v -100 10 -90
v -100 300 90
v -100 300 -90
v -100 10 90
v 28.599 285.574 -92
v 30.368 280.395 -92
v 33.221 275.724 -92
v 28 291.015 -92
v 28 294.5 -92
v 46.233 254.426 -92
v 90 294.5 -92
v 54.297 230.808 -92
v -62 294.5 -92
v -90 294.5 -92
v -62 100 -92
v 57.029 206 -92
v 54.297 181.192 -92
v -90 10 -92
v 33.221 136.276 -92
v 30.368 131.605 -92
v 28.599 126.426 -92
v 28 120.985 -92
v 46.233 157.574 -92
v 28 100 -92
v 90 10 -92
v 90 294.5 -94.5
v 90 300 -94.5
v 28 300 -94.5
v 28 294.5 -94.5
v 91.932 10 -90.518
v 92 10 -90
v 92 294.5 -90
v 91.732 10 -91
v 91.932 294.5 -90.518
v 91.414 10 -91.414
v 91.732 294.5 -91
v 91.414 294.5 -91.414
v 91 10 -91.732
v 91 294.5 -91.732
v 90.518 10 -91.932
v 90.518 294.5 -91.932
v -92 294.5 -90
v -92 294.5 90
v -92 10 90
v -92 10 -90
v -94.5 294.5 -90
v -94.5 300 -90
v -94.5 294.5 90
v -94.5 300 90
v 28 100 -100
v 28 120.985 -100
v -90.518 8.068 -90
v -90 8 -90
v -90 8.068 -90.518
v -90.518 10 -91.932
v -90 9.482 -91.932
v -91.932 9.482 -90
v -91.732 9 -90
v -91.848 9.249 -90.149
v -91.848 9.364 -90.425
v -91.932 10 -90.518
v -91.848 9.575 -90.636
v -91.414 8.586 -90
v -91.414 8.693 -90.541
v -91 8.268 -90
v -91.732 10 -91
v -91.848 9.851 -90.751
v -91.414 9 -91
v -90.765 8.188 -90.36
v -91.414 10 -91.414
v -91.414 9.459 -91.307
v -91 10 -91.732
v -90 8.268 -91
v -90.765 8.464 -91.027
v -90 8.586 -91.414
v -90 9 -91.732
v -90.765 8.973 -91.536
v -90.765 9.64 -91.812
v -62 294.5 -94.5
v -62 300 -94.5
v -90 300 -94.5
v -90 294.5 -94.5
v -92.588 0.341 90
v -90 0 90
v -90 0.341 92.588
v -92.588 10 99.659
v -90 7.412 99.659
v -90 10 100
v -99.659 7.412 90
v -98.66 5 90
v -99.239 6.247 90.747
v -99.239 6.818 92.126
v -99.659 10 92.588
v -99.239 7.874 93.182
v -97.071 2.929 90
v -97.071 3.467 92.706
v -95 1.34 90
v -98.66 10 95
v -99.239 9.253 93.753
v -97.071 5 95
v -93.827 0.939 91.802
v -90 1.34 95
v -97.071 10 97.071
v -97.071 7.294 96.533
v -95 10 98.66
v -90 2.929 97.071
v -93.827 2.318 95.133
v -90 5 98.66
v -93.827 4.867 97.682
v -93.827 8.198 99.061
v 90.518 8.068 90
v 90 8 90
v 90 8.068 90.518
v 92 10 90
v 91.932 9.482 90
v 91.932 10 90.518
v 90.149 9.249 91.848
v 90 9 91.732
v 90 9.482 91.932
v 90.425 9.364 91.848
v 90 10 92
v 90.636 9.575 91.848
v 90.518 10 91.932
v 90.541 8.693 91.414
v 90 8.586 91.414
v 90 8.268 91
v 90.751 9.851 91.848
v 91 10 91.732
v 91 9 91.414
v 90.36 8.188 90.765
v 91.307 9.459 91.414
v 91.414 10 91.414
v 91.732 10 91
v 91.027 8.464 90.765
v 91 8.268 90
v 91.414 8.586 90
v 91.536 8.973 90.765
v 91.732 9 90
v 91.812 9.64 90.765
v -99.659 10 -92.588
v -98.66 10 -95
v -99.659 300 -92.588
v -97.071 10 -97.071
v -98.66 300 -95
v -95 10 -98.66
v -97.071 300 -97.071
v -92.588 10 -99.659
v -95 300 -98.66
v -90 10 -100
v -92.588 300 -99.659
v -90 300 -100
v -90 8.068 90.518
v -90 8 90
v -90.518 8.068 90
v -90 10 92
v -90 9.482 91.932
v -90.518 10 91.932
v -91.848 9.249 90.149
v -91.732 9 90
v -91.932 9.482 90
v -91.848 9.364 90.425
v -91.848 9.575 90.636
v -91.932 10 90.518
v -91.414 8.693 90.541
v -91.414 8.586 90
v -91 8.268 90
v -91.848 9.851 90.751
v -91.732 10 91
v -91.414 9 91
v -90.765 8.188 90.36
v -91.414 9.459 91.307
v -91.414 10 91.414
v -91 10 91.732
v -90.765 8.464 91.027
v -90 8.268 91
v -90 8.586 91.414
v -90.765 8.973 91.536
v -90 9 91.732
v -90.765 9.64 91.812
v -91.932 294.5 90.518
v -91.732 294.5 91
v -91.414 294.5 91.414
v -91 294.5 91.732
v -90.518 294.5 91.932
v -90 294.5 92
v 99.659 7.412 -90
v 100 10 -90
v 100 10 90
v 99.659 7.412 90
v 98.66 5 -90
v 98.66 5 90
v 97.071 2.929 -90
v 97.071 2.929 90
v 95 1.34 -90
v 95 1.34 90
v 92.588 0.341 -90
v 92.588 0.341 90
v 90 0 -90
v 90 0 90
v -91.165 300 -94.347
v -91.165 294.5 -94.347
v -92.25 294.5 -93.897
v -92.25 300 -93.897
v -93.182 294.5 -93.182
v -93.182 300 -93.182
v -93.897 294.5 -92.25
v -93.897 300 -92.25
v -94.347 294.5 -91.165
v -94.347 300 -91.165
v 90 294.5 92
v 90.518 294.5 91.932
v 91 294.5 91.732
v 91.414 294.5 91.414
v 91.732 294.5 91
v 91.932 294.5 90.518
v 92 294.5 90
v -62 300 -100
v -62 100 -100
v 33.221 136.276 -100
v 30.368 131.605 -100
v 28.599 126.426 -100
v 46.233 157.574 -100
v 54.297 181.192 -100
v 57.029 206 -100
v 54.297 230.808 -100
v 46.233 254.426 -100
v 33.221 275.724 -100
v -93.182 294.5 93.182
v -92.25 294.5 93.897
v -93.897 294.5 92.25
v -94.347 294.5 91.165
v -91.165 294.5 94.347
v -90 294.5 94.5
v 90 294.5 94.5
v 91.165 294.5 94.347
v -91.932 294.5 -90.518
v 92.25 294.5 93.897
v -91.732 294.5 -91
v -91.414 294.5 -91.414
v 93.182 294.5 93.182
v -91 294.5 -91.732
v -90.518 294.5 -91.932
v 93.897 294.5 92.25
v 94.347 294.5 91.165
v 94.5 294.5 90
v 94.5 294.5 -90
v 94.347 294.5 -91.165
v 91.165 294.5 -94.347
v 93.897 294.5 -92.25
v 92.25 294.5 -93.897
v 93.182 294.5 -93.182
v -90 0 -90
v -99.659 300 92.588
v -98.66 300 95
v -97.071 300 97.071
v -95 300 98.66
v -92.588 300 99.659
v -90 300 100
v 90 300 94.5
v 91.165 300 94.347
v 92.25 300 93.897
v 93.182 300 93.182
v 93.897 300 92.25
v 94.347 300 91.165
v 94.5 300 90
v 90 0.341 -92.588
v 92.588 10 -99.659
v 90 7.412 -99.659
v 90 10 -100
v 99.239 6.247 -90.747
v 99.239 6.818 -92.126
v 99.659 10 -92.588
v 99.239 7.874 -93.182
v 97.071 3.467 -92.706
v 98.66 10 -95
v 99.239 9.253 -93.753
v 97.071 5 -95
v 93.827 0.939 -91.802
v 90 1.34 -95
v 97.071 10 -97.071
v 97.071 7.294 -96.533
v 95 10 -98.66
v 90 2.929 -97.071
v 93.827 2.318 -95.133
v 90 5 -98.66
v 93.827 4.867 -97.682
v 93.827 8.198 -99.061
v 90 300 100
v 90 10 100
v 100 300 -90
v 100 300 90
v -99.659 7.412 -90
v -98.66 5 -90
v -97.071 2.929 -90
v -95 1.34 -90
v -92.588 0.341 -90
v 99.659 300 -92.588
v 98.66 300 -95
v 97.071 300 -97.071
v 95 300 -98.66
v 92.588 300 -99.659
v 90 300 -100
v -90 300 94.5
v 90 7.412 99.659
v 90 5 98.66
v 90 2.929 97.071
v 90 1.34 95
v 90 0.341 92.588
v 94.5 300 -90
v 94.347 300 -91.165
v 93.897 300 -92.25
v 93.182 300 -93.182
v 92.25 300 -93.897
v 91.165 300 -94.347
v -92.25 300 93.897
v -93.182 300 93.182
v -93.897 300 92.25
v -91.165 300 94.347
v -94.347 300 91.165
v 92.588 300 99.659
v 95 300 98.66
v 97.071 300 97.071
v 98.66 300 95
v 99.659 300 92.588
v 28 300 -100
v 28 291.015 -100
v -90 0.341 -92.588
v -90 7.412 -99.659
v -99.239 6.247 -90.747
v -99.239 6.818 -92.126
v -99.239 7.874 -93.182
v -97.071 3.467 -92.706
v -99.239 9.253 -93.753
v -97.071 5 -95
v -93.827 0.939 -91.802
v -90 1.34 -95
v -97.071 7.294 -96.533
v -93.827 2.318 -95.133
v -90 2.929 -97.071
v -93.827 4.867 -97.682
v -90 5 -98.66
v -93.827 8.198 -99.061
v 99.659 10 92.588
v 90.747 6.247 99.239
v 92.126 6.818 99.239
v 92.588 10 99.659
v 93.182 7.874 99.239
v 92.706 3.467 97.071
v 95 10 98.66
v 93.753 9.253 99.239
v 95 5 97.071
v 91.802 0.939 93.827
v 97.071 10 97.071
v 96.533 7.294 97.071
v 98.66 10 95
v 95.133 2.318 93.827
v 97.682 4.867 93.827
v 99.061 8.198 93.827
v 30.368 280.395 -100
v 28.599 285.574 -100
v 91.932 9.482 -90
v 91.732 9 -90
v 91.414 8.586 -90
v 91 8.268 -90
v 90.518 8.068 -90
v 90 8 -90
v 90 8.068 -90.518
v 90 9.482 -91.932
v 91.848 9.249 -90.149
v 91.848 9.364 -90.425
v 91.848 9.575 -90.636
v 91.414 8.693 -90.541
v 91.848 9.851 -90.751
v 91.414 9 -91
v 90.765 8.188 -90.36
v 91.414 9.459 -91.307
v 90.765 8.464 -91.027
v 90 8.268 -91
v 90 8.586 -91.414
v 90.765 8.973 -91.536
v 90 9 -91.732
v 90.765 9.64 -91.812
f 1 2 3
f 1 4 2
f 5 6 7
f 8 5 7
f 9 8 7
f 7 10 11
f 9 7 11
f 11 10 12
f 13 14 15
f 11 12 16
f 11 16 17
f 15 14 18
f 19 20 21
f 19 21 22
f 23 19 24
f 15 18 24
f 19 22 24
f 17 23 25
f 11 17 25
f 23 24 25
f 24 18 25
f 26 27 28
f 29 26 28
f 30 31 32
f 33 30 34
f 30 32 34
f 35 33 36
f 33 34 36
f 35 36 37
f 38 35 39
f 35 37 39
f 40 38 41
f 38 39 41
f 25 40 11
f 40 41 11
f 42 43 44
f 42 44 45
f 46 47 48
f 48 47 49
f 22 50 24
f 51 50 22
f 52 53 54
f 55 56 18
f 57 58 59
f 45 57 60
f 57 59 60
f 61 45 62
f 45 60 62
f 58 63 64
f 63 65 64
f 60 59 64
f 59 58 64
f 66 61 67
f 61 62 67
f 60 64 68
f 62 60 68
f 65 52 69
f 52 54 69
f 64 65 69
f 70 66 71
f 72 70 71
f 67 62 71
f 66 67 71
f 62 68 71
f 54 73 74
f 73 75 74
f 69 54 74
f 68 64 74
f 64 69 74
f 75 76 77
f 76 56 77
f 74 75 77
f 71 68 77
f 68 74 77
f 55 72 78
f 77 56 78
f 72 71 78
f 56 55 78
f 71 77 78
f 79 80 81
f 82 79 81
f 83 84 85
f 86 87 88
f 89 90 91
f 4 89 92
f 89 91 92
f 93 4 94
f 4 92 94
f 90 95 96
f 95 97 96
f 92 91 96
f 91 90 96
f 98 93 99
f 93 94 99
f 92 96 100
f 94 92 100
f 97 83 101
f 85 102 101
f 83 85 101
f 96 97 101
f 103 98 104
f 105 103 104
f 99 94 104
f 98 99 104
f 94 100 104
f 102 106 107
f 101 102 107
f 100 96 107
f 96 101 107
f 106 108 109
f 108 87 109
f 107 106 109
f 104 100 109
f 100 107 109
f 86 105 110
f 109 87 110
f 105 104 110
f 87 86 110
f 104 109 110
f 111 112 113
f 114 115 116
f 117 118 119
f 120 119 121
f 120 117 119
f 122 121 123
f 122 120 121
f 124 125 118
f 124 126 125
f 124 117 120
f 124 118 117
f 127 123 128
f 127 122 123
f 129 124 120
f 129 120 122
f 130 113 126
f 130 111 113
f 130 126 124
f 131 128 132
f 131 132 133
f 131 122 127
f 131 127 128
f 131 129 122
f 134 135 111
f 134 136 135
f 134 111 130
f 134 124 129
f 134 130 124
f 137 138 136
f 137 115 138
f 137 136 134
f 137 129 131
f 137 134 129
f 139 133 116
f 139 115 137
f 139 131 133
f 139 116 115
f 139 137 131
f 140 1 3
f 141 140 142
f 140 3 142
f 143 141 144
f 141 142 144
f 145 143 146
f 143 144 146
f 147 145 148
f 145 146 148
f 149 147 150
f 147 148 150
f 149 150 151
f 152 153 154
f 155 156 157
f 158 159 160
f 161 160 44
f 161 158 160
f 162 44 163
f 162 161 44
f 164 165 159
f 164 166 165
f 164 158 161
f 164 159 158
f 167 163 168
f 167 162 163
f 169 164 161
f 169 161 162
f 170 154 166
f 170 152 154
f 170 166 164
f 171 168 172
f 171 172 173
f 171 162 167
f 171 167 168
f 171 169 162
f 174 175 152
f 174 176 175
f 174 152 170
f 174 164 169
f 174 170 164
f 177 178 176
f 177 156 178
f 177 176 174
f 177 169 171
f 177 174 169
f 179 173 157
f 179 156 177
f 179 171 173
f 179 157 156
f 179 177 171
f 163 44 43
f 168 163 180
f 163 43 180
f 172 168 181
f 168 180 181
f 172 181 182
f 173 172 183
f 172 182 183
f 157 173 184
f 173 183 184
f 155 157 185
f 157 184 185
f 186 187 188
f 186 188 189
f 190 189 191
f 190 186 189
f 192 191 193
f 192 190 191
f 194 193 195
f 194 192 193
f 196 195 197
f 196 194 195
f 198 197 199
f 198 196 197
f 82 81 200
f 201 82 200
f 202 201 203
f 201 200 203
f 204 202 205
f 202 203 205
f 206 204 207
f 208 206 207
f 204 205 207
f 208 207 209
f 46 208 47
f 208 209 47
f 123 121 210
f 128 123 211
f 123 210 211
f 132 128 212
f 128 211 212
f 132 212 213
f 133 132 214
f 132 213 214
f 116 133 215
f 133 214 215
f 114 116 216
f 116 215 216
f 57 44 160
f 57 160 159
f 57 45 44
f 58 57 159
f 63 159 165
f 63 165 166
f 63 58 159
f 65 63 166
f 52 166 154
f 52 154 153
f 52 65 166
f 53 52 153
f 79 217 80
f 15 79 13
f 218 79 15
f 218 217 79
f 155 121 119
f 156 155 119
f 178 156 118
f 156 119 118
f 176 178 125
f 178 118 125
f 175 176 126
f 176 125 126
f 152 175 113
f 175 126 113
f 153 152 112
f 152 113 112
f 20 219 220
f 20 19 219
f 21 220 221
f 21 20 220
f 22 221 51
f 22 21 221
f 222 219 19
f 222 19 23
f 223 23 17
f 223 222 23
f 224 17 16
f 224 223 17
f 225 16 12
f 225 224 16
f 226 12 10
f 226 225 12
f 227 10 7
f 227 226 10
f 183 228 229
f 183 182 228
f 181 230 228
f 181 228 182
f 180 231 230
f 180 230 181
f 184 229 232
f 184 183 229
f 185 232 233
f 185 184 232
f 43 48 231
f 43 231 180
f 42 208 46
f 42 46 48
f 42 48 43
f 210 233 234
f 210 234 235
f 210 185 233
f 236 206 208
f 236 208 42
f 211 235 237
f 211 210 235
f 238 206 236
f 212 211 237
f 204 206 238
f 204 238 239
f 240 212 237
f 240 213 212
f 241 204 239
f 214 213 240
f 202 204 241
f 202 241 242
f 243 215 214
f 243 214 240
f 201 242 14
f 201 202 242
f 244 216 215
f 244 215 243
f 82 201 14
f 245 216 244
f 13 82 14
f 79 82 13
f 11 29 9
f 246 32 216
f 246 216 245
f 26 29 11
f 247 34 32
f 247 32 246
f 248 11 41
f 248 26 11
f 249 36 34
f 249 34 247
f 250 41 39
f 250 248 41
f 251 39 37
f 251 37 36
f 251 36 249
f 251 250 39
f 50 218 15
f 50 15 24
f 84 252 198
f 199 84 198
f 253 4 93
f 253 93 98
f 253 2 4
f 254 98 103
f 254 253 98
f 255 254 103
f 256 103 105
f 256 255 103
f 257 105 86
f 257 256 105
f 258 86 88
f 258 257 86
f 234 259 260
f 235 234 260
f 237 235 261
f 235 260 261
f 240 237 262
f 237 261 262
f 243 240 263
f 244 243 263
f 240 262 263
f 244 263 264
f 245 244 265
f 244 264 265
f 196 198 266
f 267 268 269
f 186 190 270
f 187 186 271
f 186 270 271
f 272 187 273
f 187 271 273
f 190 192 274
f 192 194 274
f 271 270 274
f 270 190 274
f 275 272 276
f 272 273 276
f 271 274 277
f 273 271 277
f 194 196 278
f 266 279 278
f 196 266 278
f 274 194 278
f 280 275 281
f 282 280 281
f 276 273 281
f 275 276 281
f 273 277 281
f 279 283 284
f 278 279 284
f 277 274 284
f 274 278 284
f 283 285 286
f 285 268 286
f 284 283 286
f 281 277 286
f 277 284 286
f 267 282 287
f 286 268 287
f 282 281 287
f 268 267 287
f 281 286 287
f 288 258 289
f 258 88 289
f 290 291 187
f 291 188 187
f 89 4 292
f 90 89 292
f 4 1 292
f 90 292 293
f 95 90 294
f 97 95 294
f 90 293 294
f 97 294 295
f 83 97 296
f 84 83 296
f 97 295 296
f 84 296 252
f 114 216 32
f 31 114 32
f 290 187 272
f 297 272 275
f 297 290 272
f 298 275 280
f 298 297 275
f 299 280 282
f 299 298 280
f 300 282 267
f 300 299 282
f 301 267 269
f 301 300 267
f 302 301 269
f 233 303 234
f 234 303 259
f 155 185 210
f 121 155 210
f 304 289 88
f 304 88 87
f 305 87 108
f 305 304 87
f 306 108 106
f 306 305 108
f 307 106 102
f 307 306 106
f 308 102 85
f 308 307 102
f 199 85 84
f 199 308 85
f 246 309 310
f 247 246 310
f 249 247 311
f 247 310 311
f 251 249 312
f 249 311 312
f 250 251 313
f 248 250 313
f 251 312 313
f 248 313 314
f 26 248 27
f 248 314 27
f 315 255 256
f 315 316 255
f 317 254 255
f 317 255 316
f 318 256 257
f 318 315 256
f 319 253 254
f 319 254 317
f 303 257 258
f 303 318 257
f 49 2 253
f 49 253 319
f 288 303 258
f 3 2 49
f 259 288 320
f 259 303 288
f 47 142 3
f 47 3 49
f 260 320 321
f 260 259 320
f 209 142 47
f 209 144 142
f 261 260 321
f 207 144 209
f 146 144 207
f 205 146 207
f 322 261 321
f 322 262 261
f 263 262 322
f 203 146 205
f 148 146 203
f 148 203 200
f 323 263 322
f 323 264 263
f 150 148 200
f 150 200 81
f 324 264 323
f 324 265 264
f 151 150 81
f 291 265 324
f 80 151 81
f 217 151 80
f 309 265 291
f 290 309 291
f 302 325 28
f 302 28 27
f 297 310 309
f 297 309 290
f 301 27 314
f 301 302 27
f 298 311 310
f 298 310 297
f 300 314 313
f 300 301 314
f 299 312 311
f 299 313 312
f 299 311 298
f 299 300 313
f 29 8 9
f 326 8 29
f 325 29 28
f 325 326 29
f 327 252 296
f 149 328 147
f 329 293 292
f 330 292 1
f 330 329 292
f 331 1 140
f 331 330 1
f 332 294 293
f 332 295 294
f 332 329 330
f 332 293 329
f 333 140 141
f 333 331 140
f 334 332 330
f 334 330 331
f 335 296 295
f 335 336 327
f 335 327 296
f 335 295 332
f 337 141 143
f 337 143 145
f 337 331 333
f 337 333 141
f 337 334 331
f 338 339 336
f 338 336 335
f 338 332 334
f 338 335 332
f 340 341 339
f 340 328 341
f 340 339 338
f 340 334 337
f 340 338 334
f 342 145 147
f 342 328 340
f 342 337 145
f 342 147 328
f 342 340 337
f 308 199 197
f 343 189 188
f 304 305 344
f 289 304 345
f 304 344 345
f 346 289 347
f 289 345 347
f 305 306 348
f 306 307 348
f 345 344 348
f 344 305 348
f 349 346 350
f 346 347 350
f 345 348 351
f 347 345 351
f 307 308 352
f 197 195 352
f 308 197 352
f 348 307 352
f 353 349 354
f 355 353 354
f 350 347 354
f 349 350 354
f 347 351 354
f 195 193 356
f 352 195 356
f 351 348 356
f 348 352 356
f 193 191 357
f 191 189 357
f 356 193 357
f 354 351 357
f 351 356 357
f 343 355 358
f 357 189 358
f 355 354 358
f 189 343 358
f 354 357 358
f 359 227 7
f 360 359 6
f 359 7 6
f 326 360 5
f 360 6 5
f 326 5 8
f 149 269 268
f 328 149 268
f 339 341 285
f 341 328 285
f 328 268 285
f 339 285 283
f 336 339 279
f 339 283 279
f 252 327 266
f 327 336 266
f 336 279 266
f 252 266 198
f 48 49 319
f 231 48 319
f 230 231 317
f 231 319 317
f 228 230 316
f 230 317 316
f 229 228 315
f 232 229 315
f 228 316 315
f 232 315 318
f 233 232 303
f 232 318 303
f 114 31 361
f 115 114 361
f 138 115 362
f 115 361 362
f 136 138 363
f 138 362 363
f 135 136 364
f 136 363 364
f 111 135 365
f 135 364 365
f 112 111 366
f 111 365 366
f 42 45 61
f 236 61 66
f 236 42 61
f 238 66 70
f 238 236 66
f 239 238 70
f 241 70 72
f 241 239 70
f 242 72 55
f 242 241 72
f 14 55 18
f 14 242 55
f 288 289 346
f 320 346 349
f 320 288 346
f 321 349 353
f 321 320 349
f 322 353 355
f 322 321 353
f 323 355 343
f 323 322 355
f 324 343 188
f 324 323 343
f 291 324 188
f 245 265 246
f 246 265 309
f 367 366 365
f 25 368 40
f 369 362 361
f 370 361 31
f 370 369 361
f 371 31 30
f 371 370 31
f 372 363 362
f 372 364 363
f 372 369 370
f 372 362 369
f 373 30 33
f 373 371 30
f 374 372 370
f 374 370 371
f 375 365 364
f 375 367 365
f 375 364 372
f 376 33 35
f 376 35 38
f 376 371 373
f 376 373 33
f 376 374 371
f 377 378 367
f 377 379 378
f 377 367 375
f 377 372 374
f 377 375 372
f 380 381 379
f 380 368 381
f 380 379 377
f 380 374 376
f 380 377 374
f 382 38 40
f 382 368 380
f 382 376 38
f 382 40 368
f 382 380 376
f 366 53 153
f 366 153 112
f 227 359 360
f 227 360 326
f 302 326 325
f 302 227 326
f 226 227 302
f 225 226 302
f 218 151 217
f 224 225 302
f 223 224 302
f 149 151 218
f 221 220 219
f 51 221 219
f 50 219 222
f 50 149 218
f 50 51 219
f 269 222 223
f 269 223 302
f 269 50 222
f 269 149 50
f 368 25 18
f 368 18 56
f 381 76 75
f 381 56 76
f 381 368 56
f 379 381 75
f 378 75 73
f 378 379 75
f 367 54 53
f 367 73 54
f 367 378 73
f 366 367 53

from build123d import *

# Parameters (mm, degrees)
SKETCH1_W           = 200
SKETCH1_H           = 200
BOSS_EXTRUDE1_DEPTH = 300
FILLET1_R           = 10
SHELL1_T            = -8
CUT_EXTRUDE1_DEPTH  = 44
FILLET2_R           = 25
FILLET3_R           = 25
CUT_EXTRUDE2_DEPTH  = 5.5


with BuildPart() as part:
    # Sketch1 → Boss-Extrude1 (new body)
    with BuildSketch(Plane(origin=(0, 0, 0), x_dir=(1, 0, 0), z_dir=(0, 1, 0))):
        Rectangle(SKETCH1_W, SKETCH1_H)
    extrude(amount=BOSS_EXTRUDE1_DEPTH)

    # Fillet1
    fillet1_edges = [part.edges().sort_by_distance(p)[0] for p in [
        (0, 0, -100),
        (100, 0, 0),
        (0, 0, 100),
        (-100, 0, 0),
        (-100, 150, -100),
        (100, 150, -100),
        (100, 150, 100),
        (-100, 150, 100),
    ]]
    fillet(fillet1_edges, radius=FILLET1_R)

    # Shell1
    shell1_openings = [part.faces().sort_by_distance(p)[0] for p in [
        (0, 300, 0),
    ]]
    offset(amount=SHELL1_T, openings=shell1_openings, kind=Kind.INTERSECTION)

    # Sketch2 → Cut-Extrude1 (cut)
    with BuildSketch(Plane(origin=(0, 0, -100), x_dir=(-1, 0, 0), z_dir=(0, 0, -1))):
        with BuildLine():
            Line((62, 100), (-28, 100))
            Line((-28, 100), (-28, 130))
            ThreePointArc((-28, 130), (-57.029416855, 206), (-28, 282))
            Line((-28, 282), (-28, 300))
            Line((-28, 300), (62, 300))
            Line((62, 300), (62, 100))
        make_face()
    extrude(amount=-CUT_EXTRUDE1_DEPTH, mode=Mode.SUBTRACT)

    # Fillet2
    fillet2_edges = [part.edges().sort_by_distance(p)[0] for p in [
        (28, 130, -96),
    ]]
    fillet(fillet2_edges, radius=FILLET2_R)

    # Fillet3
    fillet3_edges = [part.edges().sort_by_distance(p)[0] for p in [
        (28, 282, -96),
    ]]
    fillet(fillet3_edges, radius=FILLET3_R)

    # Sketch3 → Cut-Extrude2 (cut)
    with BuildSketch(Plane(origin=(0, 300, 0), x_dir=(1, 0, 0), z_dir=(0, 1, 0))):
        with BuildLine():
            Line((28, 92), (90, 92))
            ThreePointArc((90, 92), (91.414213562, 91.414213562), (92, 90))
            Line((92, 90), (92, -90))
            ThreePointArc((92, -90), (91.414213562, -91.414213562), (90, -92))
            Line((90, -92), (-90, -92))
            ThreePointArc((-90, -92), (-91.414213562, -91.414213562), (-92, -90))
            Line((-92, -90), (-92, 90))
            ThreePointArc((-92, 90), (-91.414213562, 91.414213562), (-90, 92))
            Line((-90, 92), (-62, 92))
            Line((-62, 92), (-62, 94.5))
            Line((-62, 94.5), (-90, 94.5))
            ThreePointArc((-90, 94.5), (-93.181980515, 93.181980515), (-94.5, 90))
            Line((-94.5, 90), (-94.5, -90))
            ThreePointArc((-94.5, -90), (-93.181980515, -93.181980515), (-90, -94.5))
            Line((-90, -94.5), (90, -94.5))
            ThreePointArc((90, -94.5), (93.181980515, -93.181980515), (94.5, -90))
            Line((94.5, -90), (94.5, 90))
            ThreePointArc((94.5, 90), (93.181980515, 93.181980515), (90, 94.5))
            Line((90, 94.5), (28, 94.5))
            Line((28, 94.5), (28, 92))
        make_face()
    extrude(amount=-CUT_EXTRUDE2_DEPTH, mode=Mode.SUBTRACT)


solid = part.part
